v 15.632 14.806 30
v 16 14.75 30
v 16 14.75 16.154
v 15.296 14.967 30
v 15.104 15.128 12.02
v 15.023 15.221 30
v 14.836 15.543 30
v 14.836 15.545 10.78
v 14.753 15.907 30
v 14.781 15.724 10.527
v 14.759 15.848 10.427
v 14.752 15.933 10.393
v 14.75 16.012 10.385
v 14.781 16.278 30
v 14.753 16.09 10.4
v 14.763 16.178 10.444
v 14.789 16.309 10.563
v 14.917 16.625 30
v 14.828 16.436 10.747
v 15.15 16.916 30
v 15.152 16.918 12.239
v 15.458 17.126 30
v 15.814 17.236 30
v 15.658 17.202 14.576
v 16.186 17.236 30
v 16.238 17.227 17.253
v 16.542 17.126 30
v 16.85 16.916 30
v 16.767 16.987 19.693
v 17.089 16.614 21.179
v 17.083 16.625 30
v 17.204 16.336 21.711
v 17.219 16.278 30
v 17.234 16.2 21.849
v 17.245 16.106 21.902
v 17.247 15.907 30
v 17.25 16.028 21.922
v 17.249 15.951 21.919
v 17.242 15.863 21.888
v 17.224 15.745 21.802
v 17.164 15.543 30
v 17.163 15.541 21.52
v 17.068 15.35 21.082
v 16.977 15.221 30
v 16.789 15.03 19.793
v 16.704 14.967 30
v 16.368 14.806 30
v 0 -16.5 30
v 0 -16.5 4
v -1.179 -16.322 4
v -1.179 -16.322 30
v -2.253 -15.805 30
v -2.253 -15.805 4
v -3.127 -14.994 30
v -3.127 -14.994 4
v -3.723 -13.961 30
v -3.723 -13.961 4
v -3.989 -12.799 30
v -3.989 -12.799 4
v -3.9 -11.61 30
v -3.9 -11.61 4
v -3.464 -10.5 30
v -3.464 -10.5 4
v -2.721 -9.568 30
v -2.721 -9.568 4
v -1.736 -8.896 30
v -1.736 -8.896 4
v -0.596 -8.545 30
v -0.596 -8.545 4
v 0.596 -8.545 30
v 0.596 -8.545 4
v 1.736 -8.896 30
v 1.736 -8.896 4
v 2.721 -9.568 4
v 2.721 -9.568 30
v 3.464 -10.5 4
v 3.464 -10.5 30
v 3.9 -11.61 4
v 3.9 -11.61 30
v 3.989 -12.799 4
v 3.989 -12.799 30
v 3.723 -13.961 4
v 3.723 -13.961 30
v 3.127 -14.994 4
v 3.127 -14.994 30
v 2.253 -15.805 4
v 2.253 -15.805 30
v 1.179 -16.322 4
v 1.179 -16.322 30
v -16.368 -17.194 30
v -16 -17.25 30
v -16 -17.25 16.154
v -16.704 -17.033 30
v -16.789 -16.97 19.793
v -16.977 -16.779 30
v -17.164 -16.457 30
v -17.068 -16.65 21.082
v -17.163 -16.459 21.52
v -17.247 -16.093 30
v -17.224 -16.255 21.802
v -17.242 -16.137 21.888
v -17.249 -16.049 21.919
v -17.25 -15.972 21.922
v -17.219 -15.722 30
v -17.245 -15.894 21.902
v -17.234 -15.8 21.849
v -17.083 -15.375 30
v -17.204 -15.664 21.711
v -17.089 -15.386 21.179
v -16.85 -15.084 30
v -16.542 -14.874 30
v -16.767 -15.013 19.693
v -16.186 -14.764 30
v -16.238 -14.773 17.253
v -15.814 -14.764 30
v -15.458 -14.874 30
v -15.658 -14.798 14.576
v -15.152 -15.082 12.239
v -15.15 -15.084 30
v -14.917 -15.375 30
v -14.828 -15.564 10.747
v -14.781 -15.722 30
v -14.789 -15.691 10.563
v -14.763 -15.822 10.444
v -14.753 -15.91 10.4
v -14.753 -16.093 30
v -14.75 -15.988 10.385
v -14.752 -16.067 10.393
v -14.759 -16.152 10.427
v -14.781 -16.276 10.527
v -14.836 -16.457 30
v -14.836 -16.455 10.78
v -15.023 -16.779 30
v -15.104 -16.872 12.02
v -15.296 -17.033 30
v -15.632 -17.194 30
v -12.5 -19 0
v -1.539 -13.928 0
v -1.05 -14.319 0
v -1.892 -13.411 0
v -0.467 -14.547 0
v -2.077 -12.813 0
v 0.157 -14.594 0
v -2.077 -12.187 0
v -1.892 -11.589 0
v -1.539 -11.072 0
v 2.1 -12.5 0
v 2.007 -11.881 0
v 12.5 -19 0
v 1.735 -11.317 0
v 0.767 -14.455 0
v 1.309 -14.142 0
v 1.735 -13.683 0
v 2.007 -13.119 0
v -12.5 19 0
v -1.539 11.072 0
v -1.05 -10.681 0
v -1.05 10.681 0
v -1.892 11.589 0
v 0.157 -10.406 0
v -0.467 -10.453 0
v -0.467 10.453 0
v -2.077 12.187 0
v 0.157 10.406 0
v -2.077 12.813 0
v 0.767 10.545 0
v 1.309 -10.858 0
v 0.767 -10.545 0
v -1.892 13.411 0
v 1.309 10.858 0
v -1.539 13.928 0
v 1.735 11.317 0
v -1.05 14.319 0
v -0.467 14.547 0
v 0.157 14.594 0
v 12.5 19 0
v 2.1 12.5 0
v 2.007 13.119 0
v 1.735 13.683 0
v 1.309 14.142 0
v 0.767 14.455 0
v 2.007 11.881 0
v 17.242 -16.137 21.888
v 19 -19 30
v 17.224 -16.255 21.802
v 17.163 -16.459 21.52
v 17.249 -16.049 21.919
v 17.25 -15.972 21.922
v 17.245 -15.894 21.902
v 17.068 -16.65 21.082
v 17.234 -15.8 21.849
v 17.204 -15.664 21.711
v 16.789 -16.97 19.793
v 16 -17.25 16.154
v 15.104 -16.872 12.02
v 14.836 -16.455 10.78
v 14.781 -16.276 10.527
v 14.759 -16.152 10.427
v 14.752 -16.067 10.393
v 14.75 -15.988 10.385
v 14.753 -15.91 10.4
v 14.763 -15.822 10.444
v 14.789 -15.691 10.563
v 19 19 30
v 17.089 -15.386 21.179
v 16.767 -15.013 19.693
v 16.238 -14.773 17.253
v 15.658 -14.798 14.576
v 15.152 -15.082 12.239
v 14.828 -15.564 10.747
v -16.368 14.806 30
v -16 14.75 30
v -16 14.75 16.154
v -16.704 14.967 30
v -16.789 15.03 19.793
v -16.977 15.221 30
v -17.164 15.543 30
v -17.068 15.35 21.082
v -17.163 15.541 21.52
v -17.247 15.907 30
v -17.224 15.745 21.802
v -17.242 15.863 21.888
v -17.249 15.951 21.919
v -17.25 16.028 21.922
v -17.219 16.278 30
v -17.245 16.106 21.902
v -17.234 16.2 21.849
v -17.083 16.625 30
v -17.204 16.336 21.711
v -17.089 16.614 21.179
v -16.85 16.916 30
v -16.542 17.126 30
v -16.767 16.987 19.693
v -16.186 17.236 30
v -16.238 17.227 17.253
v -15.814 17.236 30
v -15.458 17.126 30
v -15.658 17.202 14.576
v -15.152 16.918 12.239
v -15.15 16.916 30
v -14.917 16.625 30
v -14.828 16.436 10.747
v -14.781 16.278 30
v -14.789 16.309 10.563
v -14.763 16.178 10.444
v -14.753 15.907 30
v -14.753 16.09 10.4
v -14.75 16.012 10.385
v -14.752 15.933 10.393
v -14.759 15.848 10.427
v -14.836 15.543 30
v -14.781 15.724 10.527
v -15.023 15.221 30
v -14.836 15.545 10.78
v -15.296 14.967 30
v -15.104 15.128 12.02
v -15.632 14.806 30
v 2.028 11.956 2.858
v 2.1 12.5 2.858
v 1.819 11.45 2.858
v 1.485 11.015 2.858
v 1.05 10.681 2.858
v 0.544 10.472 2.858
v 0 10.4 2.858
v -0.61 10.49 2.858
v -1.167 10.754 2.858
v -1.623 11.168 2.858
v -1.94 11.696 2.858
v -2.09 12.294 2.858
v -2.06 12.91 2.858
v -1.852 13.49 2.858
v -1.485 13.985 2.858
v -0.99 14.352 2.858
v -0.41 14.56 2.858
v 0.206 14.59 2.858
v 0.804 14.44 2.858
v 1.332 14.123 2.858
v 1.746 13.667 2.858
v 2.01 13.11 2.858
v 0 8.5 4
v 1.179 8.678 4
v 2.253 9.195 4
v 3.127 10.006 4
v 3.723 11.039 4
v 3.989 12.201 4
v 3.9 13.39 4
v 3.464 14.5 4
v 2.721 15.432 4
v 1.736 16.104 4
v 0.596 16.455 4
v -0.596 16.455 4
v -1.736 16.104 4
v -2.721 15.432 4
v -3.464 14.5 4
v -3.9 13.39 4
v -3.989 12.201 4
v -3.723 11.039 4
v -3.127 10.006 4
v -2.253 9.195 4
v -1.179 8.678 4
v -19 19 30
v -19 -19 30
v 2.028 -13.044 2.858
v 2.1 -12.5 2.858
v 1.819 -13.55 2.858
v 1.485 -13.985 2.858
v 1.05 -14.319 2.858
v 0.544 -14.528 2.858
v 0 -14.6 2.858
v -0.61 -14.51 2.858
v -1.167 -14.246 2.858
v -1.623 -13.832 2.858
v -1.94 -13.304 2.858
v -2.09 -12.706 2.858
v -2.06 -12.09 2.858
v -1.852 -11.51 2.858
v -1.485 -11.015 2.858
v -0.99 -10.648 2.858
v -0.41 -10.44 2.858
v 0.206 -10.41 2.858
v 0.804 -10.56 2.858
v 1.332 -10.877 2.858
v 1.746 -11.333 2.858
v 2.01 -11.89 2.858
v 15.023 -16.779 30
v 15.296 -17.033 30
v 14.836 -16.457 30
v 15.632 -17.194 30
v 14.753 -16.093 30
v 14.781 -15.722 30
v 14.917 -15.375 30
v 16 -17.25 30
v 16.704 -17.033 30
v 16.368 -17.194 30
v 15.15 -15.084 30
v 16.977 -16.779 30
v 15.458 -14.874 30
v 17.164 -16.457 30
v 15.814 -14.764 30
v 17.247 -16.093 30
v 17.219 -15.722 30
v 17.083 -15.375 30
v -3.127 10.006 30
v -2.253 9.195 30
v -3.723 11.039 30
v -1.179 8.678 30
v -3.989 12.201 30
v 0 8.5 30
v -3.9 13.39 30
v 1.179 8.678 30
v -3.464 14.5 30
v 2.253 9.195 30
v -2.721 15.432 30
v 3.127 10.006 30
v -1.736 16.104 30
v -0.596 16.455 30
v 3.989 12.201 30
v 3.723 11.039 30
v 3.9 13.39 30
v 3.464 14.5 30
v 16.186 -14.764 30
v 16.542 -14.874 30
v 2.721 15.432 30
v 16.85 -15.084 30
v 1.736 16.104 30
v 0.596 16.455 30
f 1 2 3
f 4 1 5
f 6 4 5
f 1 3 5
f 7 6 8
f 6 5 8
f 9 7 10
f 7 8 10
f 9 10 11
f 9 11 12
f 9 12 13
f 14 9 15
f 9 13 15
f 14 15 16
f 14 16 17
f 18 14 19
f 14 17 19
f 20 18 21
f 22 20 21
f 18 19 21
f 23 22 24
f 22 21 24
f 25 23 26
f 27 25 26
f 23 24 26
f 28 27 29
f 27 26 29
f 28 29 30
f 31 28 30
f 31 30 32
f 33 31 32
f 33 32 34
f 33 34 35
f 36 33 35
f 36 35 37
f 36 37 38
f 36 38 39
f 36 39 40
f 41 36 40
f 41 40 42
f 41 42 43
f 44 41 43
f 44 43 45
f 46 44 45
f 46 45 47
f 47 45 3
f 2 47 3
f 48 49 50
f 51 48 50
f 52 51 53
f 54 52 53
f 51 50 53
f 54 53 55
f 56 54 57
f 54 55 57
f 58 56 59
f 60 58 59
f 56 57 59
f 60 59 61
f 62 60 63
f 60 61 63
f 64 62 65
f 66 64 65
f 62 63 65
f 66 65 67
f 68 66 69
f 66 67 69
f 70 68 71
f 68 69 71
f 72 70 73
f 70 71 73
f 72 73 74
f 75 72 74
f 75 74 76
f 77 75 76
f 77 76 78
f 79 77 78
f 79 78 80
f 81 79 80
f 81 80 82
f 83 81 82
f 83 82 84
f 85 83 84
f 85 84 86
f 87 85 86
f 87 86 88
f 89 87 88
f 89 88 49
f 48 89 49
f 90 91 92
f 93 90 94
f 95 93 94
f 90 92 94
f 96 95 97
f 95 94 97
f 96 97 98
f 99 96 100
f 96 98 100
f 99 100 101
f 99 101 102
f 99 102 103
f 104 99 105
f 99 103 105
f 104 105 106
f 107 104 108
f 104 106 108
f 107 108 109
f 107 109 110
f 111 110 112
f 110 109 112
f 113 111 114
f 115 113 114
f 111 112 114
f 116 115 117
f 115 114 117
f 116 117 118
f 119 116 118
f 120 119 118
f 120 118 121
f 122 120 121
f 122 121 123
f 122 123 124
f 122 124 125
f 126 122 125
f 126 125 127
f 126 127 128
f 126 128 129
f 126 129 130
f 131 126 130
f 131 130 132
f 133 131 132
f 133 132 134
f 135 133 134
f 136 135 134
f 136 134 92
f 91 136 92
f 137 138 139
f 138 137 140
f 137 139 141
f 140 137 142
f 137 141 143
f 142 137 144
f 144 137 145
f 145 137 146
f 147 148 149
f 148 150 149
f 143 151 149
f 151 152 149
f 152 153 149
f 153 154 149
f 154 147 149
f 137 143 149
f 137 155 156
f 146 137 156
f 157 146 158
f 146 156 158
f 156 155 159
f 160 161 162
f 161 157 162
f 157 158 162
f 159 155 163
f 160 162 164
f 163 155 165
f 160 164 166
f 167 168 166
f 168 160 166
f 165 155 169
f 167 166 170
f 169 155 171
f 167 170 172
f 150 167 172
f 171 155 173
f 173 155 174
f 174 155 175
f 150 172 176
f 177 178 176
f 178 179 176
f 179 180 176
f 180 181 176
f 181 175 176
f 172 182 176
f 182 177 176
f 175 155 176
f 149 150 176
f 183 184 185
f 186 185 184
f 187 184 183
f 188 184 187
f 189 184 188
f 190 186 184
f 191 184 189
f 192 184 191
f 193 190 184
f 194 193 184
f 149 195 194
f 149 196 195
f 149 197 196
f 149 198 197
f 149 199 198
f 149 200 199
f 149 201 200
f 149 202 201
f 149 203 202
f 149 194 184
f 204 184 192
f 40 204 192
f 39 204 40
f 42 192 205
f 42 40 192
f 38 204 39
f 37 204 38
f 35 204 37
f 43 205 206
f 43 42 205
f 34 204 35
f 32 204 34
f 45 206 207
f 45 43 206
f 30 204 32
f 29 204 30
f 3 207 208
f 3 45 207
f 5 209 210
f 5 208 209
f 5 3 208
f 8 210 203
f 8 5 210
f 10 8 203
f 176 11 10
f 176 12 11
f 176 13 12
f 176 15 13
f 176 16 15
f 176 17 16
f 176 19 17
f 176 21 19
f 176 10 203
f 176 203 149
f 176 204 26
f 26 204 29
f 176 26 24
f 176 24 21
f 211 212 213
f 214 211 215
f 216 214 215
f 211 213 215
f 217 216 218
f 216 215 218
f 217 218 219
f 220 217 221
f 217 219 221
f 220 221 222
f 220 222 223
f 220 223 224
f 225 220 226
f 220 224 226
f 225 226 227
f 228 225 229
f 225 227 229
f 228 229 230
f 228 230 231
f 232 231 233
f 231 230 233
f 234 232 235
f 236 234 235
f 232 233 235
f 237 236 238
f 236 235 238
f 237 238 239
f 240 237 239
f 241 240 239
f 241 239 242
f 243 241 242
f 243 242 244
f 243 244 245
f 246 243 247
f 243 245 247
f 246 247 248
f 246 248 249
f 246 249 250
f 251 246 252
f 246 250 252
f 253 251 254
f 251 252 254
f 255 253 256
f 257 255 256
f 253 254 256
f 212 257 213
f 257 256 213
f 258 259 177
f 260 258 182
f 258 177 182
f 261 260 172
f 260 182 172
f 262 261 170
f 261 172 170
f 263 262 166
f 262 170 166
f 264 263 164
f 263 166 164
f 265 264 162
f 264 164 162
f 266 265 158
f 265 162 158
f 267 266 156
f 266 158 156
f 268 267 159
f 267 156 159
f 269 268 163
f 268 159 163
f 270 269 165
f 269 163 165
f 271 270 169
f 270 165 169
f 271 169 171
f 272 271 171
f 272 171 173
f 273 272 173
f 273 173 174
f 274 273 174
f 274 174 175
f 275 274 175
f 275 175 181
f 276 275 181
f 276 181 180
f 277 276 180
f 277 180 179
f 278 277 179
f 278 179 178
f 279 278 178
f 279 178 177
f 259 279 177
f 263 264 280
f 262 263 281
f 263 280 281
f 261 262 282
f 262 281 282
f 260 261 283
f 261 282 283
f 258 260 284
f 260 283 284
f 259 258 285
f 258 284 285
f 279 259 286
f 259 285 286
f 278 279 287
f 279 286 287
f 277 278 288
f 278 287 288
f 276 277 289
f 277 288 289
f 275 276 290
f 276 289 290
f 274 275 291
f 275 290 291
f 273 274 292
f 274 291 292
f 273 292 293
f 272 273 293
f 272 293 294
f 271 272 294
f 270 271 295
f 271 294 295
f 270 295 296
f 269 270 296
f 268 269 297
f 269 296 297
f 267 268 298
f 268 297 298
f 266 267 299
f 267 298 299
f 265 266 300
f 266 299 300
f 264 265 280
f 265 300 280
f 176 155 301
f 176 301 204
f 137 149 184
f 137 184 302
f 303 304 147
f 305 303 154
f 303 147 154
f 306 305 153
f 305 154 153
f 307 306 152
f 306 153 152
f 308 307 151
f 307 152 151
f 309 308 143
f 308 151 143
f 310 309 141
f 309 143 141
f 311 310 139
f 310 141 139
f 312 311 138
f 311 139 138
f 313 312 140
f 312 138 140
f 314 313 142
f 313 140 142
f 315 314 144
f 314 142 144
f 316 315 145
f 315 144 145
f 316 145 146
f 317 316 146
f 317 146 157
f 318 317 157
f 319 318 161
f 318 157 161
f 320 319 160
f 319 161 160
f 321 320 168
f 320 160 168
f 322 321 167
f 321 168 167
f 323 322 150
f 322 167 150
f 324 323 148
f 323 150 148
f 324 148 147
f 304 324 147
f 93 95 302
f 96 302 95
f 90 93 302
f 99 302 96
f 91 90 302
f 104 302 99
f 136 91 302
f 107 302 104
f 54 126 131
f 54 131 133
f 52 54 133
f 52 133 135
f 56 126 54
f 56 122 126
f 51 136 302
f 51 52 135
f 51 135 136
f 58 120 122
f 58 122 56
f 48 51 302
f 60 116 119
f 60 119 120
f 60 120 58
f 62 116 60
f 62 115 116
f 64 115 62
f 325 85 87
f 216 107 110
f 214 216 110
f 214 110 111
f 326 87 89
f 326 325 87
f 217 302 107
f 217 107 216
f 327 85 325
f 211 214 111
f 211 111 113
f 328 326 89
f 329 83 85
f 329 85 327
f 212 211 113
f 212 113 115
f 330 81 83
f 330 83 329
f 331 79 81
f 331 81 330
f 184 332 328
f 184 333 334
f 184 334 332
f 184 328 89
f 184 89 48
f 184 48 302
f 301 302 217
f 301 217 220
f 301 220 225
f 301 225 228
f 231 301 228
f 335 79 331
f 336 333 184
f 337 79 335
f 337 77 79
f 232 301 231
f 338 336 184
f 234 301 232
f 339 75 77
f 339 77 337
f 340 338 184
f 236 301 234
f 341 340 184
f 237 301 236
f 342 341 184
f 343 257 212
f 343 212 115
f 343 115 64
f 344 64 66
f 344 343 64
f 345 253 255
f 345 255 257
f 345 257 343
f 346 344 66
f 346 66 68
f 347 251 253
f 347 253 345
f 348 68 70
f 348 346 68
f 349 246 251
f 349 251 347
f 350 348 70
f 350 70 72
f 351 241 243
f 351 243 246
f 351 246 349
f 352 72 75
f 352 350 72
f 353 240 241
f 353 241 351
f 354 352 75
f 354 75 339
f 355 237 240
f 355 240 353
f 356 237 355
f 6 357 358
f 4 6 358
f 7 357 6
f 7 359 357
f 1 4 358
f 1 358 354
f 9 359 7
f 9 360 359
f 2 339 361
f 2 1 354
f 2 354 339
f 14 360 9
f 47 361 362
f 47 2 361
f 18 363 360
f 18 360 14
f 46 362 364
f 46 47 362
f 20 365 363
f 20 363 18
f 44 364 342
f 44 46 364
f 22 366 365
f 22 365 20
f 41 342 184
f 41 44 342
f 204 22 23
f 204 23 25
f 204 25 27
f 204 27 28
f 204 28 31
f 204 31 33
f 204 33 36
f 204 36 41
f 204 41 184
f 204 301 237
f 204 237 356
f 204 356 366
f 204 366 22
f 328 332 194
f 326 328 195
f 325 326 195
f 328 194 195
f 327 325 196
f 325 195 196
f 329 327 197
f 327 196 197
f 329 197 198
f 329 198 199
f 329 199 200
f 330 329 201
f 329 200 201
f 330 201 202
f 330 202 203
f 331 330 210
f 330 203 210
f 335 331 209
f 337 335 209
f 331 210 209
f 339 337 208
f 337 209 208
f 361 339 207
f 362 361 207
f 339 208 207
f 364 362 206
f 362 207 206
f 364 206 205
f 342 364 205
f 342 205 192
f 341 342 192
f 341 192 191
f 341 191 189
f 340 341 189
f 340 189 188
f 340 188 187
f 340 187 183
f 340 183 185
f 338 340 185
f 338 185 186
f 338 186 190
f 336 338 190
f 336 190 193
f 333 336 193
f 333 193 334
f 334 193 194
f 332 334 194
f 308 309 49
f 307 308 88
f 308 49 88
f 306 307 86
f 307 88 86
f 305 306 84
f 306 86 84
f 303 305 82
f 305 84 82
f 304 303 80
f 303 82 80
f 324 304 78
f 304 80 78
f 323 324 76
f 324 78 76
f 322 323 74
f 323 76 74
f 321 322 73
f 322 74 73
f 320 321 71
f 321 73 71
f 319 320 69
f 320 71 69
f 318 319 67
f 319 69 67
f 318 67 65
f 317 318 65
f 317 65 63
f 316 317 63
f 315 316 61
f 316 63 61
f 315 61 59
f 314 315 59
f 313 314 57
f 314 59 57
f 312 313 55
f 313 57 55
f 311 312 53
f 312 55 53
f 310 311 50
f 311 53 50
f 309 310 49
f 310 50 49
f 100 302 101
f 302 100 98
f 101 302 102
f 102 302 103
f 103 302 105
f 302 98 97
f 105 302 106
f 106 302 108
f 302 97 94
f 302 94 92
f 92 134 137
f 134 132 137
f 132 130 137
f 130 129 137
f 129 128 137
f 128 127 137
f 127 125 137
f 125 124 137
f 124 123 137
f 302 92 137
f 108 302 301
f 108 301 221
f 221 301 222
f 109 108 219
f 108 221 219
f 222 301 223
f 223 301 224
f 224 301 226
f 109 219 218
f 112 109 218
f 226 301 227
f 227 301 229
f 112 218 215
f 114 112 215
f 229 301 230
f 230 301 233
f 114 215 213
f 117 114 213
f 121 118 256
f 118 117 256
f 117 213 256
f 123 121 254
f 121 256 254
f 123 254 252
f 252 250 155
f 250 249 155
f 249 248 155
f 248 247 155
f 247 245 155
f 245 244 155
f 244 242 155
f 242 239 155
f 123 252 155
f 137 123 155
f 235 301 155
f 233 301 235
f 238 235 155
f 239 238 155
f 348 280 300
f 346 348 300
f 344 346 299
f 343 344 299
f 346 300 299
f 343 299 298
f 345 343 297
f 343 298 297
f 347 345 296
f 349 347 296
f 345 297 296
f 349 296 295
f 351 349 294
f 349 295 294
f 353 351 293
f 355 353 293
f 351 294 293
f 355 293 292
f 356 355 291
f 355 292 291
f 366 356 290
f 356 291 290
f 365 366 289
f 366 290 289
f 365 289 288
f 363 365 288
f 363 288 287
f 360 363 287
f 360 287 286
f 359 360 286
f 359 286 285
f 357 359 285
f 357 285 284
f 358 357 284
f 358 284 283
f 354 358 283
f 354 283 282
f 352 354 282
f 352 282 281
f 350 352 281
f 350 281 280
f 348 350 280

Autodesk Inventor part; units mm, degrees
ref_plane "YZ Plane" through (0, 0, 0) normal (1, 0, 0) x (0, 1, 0)
ref_plane "XZ Plane" through (0, 0, 0) normal (0, 1, 0) x (-1, 0, 0)
ref_plane "XY Plane" through (0, 0, 0) normal (0, 0, 1) x (1, 0, 0)
sketch "Sketch1" plane through (0, 0, 0) normal (0, 0, 1) x (1, 0, 0)
  line L0 (12.5, -19) -> (-12.5, -19)
  line L1 (-12.5, -19) -> (-12.5, 19)
  line L2 (-12.5, 19) -> (12.5, 19)
  line L3 (12.5, 19) -> (12.5, -19)
  line L4 (12.5, -19) -> (-12.5, 19) construction
  line L5 (-12.5, -19) -> (12.5, 19) construction
  circle A0 centre (0, 12.5) radius 2.1
  circle A1 centre (0, -12.5) radius 2.1
  point P0 (0, 0)
  dimension "d0" = 25
  dimension "d1" = 38
  dimension "d2" = 4.2
  dimension "d3" = 4.2
  dimension "d4" = 12.5
  dimension "d5" = 12.5
extrude "Extrusion1" add sketch "Sketch1" along normal blind 30
sketch "Sketch2" plane through (-12.5, 19, 0) normal (0, 1, 0) x (1, 0, 0)
  line L0 (0, 0) -> (0, -30) projected
  line L1 (0, -30) -> (-6.5, -30)
  line L2 (-6.5, -30) -> (0, 0)
  line L3 (0, -30) -> (25, -30) projected
  line L4 (0, 0) -> (0, -30)
  line L5 (25, -30) -> (31.5, -30)
  line L6 (25, 0) -> (25, -30) projected
  line L7 (31.5, -30) -> (25, 0)
  line L8 (25, 0) -> (25, -30)
  point P0 (12.5, 0)
  dimension "d8" = 6.5
  dimension "d9" = 6.5
extrude "Extrusion2" add sketch "Sketch2" against normal up to surface (38 mm away)
sketch "Sketch3" plane through (0, 0, 30) normal (0, 0, 1) x (1, 0, 0)
  line L0 (-5.4088, 0) -> (7.7062, 0)
  line L1 (0, 5.8117) -> (0, -6.6687)
  point P0 (0, 0)
  point P1 (-16, 16)
  point P2 (16, 16)
  point P3 (-16, -16)
  point P4 (16, -16)
  dimension "d12" = 16
  dimension "d13" = 16
  dimension "d16" = 32
  dimension "d19" = 32
hole "Hole1" at (-16, 16, 30) at (16, 16, 30) at (-16, -16, 30) at (16, -16, 30) direction (0, 0, -1) diameter 2.5 depth 20 tip angle 118
hole "Hole2" at (0, -12.5, 30) direction (0, 0, -1) diameter 8 depth 26 tip angle 118
hole "Hole3" at (0, 12.5, 30) direction (0, 0, -1) diameter 8 depth 26 tip angle 118
properties part number "RDtoRC2-height30mm"
